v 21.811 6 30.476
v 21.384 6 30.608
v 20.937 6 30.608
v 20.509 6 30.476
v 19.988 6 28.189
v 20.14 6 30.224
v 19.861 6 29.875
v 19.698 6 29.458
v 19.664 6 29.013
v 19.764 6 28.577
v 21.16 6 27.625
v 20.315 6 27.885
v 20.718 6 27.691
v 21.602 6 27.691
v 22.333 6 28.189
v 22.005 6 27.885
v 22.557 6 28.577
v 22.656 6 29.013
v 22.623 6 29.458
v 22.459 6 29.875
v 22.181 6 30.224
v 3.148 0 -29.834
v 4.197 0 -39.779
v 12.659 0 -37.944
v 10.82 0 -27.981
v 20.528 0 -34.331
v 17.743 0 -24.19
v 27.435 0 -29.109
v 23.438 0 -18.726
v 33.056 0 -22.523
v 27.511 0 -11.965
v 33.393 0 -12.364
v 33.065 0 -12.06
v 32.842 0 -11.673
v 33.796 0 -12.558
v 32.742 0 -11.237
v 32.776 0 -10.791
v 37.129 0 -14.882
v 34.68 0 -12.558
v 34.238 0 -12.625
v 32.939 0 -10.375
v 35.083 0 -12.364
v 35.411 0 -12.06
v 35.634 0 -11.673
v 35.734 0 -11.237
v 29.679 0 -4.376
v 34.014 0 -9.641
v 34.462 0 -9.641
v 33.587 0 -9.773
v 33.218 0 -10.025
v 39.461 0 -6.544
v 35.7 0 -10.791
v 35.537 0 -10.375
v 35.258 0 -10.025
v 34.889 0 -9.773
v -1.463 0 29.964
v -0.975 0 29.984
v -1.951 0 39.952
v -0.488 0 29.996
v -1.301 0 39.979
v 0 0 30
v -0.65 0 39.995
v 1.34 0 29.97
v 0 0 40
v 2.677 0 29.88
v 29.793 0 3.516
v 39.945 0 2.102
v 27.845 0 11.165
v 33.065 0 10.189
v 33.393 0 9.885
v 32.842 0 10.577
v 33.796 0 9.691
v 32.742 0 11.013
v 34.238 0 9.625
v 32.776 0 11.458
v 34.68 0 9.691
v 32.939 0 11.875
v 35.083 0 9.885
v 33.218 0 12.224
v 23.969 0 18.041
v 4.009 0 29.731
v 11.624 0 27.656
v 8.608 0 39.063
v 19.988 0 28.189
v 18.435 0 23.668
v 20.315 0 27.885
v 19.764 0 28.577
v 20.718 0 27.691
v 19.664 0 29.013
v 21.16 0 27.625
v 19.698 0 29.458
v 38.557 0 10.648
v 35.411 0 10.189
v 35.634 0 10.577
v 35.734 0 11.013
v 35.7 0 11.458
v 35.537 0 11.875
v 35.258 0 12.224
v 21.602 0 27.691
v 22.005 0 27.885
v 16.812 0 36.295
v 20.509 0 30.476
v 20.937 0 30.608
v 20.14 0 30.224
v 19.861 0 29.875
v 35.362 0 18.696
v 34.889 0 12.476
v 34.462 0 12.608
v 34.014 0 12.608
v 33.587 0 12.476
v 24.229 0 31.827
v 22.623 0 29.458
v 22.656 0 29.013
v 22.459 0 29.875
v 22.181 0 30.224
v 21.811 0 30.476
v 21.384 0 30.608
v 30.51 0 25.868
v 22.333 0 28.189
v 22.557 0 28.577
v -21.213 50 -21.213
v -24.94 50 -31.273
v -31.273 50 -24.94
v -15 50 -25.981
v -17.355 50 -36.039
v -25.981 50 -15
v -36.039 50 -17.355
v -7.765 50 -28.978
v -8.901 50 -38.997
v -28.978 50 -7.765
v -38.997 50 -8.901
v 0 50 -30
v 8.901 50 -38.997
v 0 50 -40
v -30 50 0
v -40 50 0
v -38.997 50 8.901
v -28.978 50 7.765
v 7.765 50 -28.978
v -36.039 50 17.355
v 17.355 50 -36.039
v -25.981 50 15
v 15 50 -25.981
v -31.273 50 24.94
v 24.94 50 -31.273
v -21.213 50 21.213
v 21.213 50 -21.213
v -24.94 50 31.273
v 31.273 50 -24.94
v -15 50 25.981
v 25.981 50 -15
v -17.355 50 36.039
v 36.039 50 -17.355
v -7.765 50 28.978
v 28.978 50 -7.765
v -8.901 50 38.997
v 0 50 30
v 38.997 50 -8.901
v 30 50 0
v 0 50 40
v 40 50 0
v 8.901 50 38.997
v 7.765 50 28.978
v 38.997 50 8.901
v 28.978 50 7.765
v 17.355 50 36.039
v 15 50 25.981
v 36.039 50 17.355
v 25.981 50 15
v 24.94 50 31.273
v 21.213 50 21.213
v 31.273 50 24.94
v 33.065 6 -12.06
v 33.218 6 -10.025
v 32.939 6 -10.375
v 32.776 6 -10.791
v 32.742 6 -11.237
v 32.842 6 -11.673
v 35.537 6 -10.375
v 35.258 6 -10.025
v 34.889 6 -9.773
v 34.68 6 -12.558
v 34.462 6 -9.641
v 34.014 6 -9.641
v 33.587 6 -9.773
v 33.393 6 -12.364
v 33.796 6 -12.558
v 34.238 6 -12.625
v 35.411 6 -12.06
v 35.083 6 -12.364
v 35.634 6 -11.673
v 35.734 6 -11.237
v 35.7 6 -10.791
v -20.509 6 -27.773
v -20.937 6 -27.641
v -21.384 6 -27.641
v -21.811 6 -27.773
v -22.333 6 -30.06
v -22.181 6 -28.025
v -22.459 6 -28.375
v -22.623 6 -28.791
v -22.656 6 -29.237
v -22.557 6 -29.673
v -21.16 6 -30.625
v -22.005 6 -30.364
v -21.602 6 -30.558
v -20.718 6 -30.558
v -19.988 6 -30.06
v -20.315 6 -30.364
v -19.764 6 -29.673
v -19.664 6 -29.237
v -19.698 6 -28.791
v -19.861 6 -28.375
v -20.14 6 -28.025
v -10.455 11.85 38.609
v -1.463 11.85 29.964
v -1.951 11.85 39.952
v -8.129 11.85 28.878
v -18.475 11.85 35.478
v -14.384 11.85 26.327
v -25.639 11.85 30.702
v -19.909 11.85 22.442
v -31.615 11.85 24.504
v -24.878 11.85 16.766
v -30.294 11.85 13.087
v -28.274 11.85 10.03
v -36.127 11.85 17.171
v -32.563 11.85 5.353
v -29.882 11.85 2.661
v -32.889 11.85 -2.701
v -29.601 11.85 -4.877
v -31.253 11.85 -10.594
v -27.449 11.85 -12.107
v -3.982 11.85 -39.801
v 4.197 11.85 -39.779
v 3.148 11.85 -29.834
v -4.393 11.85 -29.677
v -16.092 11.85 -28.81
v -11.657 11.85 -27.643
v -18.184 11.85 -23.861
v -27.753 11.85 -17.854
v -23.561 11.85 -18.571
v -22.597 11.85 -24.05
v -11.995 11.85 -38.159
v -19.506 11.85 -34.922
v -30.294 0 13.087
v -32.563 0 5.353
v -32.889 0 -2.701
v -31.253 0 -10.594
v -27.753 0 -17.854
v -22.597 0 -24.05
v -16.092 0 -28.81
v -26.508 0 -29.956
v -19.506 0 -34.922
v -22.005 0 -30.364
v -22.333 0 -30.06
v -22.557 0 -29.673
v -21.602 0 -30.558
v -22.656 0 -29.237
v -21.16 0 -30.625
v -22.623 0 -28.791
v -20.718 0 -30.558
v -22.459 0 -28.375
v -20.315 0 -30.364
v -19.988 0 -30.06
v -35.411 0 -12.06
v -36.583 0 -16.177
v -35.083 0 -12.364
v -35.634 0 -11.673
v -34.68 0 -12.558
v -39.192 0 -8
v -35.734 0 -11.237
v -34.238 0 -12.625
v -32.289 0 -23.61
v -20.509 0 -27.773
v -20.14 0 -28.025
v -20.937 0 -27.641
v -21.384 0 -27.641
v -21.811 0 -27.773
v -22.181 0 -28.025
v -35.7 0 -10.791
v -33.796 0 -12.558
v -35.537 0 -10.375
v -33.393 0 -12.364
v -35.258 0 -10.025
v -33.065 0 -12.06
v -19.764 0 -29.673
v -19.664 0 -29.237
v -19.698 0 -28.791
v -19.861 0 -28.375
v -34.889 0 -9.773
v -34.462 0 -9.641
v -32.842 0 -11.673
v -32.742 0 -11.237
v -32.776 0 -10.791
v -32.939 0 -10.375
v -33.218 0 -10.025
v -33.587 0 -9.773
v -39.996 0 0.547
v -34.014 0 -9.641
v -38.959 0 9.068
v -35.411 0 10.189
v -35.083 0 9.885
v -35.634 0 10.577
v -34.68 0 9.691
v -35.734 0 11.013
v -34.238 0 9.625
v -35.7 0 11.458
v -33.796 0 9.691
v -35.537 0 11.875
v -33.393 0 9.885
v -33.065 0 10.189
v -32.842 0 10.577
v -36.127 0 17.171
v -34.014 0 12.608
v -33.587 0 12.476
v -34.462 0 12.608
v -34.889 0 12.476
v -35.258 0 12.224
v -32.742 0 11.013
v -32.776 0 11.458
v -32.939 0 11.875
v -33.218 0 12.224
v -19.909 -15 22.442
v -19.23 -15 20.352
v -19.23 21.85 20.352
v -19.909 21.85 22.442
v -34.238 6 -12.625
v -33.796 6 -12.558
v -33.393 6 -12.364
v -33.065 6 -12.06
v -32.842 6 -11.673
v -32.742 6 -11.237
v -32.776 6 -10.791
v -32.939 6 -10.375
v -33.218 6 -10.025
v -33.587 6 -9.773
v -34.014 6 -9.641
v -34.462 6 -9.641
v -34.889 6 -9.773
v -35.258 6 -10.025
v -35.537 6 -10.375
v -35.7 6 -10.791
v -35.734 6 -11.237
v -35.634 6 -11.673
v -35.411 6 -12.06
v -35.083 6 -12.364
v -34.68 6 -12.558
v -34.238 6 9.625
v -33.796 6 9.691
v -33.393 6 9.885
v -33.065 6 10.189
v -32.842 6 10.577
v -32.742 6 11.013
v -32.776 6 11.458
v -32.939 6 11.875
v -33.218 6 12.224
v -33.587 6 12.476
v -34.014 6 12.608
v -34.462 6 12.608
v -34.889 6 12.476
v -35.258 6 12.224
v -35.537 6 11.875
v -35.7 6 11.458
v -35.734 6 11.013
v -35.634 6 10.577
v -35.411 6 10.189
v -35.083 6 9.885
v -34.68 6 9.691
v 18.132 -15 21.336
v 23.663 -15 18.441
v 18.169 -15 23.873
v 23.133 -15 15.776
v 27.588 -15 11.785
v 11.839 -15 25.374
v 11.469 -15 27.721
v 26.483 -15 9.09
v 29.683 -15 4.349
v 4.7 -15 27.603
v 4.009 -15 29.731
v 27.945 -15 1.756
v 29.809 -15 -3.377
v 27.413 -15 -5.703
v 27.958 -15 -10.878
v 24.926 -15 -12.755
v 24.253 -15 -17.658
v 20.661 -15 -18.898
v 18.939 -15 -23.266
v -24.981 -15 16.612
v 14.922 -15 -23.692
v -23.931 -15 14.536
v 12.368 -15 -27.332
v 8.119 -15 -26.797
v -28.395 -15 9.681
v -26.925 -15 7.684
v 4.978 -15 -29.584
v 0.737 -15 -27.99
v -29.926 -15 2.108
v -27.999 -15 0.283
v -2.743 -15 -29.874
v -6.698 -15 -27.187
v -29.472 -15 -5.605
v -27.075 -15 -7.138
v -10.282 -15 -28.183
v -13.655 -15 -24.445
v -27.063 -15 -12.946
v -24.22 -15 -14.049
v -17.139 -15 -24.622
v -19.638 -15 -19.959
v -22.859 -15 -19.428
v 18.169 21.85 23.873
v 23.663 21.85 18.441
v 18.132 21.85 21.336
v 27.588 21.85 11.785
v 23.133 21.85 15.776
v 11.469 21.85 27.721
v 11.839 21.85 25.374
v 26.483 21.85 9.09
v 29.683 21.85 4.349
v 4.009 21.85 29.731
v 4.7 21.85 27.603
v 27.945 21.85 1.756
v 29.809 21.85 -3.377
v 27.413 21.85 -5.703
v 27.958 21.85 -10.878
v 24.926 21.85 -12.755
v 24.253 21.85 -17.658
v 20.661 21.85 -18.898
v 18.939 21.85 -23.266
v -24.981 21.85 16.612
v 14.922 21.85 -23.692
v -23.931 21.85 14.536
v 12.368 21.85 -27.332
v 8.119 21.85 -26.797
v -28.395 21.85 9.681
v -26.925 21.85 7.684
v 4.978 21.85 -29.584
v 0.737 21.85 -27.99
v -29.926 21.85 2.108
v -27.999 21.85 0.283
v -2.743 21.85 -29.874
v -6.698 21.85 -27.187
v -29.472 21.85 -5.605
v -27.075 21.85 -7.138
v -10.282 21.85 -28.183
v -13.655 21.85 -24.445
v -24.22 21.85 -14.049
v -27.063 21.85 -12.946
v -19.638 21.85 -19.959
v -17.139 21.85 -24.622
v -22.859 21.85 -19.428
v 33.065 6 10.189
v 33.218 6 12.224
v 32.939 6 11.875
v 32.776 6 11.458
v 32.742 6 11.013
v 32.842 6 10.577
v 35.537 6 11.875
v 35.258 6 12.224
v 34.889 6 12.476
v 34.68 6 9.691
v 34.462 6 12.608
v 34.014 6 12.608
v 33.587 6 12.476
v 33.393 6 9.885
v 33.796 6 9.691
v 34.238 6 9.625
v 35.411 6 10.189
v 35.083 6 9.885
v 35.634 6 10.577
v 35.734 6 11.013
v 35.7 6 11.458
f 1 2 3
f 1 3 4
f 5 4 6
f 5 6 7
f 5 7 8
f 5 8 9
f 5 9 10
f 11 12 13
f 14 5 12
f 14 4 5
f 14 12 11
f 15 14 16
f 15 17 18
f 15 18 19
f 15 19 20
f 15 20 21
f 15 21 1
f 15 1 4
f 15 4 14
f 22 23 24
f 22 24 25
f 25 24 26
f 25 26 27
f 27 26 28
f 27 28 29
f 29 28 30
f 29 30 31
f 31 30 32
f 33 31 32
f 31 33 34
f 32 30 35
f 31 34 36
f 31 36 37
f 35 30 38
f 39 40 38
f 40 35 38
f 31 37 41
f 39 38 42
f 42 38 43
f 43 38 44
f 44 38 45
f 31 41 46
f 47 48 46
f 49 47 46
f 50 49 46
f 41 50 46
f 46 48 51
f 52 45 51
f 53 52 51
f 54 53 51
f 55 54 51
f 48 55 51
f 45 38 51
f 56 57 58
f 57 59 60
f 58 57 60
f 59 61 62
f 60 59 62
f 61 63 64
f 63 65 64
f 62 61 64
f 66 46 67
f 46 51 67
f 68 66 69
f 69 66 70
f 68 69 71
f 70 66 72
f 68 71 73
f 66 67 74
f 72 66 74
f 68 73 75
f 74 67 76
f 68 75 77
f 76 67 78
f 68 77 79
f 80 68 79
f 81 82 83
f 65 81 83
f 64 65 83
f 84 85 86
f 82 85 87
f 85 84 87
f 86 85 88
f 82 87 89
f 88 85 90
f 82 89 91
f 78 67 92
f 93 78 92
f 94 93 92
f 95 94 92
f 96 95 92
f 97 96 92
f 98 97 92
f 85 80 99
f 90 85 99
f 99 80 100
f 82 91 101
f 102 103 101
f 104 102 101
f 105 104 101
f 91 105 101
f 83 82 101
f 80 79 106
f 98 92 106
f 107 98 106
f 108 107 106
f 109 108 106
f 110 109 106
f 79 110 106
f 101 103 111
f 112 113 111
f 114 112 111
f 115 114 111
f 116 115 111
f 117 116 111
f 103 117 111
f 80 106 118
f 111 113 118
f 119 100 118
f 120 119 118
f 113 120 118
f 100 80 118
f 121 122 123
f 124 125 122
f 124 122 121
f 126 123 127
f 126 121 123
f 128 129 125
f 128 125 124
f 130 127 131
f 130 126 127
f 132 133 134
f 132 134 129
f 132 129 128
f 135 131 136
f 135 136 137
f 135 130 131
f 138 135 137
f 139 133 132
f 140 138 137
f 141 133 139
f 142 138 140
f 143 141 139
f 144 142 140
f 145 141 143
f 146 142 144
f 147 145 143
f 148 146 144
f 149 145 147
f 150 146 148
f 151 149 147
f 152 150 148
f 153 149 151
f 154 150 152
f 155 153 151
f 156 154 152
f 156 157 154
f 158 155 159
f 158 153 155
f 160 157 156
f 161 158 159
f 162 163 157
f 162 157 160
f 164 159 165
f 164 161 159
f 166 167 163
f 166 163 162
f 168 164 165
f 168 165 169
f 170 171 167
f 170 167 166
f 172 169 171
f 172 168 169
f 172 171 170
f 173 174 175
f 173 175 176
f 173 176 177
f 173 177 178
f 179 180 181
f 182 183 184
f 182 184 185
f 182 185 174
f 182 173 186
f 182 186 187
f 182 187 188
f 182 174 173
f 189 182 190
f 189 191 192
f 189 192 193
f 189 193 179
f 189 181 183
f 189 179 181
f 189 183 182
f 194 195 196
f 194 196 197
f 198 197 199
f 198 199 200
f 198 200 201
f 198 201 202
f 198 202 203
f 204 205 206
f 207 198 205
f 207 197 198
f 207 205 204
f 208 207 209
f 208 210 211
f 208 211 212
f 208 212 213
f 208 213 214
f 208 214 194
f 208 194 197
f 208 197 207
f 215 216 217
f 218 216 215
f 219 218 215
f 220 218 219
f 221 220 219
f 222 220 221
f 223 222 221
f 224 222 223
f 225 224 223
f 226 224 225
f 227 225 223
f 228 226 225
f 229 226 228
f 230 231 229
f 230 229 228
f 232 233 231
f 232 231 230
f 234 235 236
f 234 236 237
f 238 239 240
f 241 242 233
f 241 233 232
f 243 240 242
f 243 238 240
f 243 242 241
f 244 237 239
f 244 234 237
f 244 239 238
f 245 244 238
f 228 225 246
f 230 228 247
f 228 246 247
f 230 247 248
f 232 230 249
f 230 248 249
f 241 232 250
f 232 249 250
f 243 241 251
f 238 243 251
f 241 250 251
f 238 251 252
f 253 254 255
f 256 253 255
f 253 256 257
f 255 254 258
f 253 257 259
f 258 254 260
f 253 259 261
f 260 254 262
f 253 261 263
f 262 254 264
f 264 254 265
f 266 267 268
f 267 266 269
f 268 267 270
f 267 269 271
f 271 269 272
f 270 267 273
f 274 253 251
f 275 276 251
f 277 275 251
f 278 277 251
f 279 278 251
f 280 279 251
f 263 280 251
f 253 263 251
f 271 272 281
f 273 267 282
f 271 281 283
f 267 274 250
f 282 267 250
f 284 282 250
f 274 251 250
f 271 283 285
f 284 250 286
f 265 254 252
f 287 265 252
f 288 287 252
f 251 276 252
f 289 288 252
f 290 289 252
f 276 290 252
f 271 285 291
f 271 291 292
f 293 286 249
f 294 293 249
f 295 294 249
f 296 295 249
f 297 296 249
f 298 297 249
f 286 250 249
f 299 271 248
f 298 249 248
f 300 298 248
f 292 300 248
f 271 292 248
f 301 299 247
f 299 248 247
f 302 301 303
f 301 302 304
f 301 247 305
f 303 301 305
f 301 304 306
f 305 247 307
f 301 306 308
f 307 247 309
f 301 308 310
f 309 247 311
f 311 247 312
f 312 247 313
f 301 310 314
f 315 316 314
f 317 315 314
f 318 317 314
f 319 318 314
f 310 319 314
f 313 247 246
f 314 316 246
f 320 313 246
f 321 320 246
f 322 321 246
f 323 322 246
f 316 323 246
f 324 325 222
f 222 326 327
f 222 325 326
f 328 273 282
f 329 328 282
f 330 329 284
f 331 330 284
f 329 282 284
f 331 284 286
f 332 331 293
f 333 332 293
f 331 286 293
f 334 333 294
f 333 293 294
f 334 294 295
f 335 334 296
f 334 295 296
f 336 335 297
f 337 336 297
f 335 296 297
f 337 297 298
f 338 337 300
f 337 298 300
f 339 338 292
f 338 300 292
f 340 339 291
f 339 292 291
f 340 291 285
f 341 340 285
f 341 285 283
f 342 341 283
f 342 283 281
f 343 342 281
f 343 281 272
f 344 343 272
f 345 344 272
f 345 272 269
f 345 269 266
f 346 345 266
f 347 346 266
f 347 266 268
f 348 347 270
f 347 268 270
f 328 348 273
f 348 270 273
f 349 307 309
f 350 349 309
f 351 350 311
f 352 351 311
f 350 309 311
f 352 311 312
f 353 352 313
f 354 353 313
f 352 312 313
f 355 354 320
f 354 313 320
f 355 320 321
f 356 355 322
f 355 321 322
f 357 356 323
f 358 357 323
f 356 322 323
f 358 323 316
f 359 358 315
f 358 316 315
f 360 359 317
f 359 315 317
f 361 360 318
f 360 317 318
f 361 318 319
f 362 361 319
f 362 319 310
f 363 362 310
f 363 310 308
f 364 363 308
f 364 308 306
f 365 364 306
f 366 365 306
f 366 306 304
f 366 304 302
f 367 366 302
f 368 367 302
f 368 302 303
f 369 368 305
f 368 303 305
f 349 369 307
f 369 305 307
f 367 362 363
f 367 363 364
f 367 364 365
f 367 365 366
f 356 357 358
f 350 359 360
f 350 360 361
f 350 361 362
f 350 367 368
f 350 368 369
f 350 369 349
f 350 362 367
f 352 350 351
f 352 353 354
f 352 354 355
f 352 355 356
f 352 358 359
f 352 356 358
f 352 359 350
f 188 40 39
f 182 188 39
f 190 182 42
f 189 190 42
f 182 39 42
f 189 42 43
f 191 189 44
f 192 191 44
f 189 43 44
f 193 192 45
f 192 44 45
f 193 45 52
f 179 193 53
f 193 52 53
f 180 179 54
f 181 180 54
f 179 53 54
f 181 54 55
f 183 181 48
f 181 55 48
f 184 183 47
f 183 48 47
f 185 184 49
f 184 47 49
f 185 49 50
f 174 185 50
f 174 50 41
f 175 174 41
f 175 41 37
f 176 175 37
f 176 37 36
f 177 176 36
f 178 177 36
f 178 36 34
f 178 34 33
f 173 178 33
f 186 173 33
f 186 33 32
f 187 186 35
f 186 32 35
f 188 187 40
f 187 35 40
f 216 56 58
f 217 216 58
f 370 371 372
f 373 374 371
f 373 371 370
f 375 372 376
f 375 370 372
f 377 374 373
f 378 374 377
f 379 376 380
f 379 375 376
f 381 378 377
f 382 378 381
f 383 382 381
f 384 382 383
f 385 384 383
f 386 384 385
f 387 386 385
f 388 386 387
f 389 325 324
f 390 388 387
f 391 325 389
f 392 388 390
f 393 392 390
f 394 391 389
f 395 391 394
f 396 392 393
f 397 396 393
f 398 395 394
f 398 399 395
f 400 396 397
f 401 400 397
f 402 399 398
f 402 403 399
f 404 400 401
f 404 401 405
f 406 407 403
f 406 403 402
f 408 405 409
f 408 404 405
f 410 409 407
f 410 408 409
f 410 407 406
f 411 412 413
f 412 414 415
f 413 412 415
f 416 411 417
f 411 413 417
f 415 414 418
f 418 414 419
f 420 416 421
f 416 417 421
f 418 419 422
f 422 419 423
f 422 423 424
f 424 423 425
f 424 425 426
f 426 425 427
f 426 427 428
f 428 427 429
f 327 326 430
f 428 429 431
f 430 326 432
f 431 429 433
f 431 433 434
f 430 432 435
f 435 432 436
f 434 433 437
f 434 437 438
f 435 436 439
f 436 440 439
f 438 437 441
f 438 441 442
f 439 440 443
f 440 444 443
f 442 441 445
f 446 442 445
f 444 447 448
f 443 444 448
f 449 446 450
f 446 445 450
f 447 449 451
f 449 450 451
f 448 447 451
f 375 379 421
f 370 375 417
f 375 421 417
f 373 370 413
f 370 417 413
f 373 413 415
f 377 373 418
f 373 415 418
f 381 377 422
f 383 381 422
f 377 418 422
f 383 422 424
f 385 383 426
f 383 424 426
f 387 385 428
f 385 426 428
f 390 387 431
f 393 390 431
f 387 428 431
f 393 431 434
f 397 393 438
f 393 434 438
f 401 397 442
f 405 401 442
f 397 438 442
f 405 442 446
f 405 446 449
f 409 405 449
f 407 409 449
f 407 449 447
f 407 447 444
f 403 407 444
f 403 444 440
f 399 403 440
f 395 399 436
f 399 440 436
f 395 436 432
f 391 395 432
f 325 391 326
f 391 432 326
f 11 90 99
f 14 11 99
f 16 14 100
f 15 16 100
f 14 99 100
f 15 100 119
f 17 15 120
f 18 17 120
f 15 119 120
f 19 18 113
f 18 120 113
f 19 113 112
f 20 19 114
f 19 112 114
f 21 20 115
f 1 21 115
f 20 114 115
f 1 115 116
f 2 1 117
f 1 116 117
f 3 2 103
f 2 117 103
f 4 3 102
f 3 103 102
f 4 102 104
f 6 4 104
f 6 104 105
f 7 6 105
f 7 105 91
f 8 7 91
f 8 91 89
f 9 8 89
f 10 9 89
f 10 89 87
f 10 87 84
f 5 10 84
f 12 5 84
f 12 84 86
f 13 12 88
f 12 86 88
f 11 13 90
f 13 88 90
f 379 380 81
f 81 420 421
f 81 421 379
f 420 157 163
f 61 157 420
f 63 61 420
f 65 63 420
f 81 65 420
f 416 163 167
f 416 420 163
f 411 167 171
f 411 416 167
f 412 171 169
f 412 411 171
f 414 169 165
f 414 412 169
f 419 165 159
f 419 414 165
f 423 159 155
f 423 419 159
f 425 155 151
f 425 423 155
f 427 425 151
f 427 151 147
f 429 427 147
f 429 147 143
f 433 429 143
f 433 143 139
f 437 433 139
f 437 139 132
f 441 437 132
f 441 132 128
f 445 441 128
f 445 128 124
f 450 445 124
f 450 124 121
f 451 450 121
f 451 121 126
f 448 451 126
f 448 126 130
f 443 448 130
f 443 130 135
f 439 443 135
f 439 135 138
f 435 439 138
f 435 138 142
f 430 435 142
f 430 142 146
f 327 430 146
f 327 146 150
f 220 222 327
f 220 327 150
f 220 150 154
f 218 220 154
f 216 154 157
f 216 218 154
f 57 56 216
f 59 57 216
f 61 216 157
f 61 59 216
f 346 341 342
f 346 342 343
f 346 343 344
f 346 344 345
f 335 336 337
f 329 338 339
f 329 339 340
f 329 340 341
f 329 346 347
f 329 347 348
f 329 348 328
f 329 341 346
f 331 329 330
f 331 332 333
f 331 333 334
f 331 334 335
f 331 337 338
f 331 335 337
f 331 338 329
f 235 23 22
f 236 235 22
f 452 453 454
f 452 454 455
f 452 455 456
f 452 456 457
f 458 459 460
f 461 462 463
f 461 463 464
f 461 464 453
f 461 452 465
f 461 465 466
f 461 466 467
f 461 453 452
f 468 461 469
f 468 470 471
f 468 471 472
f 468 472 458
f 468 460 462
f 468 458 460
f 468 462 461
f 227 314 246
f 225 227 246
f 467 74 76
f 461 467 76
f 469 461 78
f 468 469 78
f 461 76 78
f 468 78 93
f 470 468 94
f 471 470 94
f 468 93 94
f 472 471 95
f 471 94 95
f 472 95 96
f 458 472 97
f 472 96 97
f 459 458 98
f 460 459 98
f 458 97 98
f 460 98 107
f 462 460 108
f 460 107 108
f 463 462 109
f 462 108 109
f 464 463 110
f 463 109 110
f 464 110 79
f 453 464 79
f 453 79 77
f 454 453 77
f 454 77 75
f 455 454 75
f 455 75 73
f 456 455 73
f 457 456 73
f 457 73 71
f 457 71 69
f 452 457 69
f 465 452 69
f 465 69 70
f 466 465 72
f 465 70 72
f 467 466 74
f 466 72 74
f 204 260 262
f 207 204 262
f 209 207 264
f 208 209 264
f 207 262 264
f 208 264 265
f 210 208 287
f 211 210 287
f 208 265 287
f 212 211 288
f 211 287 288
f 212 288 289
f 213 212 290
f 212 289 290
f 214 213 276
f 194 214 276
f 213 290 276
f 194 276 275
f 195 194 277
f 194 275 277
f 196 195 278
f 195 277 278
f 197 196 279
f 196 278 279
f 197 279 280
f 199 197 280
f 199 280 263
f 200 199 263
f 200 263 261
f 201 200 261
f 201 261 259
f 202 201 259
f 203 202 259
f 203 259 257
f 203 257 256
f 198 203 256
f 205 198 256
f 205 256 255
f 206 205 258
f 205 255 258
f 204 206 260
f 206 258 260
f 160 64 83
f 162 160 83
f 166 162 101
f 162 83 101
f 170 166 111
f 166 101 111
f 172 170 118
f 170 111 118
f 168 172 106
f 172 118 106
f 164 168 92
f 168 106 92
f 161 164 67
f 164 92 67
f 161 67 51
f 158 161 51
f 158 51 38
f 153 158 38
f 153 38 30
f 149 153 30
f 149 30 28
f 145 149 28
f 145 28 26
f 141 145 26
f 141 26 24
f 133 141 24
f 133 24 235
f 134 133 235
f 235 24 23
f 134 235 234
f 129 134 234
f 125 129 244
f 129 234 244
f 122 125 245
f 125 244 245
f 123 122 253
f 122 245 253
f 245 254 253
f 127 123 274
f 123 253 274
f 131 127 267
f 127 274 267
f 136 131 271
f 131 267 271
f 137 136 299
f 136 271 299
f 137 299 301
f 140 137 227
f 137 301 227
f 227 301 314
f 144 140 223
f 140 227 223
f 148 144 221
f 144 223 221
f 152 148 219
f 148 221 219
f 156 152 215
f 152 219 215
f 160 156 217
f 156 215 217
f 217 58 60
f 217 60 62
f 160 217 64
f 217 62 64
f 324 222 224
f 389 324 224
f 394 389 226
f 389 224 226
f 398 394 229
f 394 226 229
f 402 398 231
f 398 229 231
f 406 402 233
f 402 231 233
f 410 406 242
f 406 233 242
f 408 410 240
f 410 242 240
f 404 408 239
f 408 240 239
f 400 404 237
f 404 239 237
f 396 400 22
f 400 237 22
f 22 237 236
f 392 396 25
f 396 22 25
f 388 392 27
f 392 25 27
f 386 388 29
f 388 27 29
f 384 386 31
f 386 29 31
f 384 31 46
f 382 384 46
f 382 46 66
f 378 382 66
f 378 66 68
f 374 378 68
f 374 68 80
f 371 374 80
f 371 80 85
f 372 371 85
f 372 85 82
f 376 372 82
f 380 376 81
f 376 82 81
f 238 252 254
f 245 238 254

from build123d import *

# Parameters (mm, degrees)
ESBO_O1_R                     = 40
ESBO_O1_R_2                   = 30
RESSALTO_EXTRUS_O1_DEPTH      = 50
ESBO_O2_R                     = 1.5
CORTE_EXTRUS_O1_DEPTH         = 6
CORTE_EXTRUS_O2_DEPTH         = 11.84997677
RESSALTO_EXTRUS_O2_DEPTH      = 26.84997677
RESSALTO_EXTRUS_O2_DEPTH_BACK = 10


with BuildPart() as part:
    # Esboço1 → Ressalto-extrusão1 (new body)
    with BuildSketch(Plane(origin=(0, 0, 0), x_dir=(1, 0, 0), z_dir=(0, 1, 0))):
        with Locations(Location((0, 0, 0), (0, 0, 270))):
            Circle(ESBO_O1_R)
        with Locations(Location((0, 0, 0), (0, 0, 270))):
            Circle(ESBO_O1_R_2, mode=Mode.SUBTRACT)
    extrude(amount=RESSALTO_EXTRUS_O1_DEPTH)

    # Esboço2 → Corte-extrusão1 (cut)
    with BuildSketch(Plane(origin=(0, 0, 0), x_dir=(-1, 0, 0), z_dir=(0, -1, 0))):
        with Locations(Location((-21.160269083, -29.124611797, 0), (0, 0, 90))):
            Circle(ESBO_O2_R)
        with Locations(Location((-34.238034587, -11.124611797, 0), (0, 0, 90))):
            Circle(ESBO_O2_R)
        with Locations(Location((-34.238034587, 11.124611797, 0), (0, 0, 90))):
            Circle(ESBO_O2_R)
        with Locations(Location((21.160269083, 29.124611797, 0), (0, 0, 90))):
            Circle(ESBO_O2_R)
        with Locations(Location((34.238034587, 11.124611797, 0), (0, 0, 90))):
            Circle(ESBO_O2_R)
        with Locations(Location((34.238034587, -11.124611797, 0), (0, 0, 90))):
            Circle(ESBO_O2_R)
    extrude(amount=-CORTE_EXTRUS_O1_DEPTH, mode=Mode.SUBTRACT)

    # Esboço3 → Corte-extrusão2 (cut)
    with BuildSketch(Plane(origin=(0, 0, 0), x_dir=(-1, 0, 0), z_dir=(0, -1, 0))):
        with BuildLine():
            ThreePointArc((30.293924668, -13.087327008), (31.253408489, 10.593604572), (16.092357529, 28.81034587))
            Line((16.092357529, 28.81034587), (19.505887914, 34.921631358))
            ThreePointArc((19.505887914, 34.921631358), (8.030354378, 39.185627576), (-4.197370073, 39.779166463))
            Line((-4.197370073, 39.779166463), (-3.148027555, 29.834374847))
            ThreePointArc((-3.148027555, 29.834374847), (29.911212101, 2.306380417), (1.462902849, -29.964310692))
            Line((1.462902849, -29.964310692), (1.950537132, -39.952414256))
            ThreePointArc((1.950537132, -39.952414256), (22.185986252, -33.283359416), (36.126859334, -17.171197823))
            Line((36.126859334, -17.171197823), (30.293924668, -13.087327008))
        make_face()
    extrude(amount=-CORTE_EXTRUS_O2_DEPTH, mode=Mode.SUBTRACT)

    # Esboço4 → Ressalto-extrusão2 (add, two sides: drawn at the far end of the back side and taken through both)
    with BuildSketch(Plane(origin=(0, 11.84997677, 0), x_dir=(-1, 0, 0), z_dir=(0, -1, 0)).offset(-RESSALTO_EXTRUS_O2_DEPTH_BACK)):
        with BuildLine():
            Line((-4.008838629, -29.730947056), (-4.700362463, -27.602655537))
            ThreePointArc((-4.700362463, -27.602655537), (-8.119302432, 26.79695744), (19.230258499, -20.351834268))
            Line((19.230258499, -20.351834268), (19.909240802, -22.441526924))
            ThreePointArc((19.909240802, -22.441526924), (-8.745833796, 28.696870757), (-4.008838629, -29.730947056))
        make_face()
    extrude(amount=RESSALTO_EXTRUS_O2_DEPTH + RESSALTO_EXTRUS_O2_DEPTH_BACK)


solid = part.part
